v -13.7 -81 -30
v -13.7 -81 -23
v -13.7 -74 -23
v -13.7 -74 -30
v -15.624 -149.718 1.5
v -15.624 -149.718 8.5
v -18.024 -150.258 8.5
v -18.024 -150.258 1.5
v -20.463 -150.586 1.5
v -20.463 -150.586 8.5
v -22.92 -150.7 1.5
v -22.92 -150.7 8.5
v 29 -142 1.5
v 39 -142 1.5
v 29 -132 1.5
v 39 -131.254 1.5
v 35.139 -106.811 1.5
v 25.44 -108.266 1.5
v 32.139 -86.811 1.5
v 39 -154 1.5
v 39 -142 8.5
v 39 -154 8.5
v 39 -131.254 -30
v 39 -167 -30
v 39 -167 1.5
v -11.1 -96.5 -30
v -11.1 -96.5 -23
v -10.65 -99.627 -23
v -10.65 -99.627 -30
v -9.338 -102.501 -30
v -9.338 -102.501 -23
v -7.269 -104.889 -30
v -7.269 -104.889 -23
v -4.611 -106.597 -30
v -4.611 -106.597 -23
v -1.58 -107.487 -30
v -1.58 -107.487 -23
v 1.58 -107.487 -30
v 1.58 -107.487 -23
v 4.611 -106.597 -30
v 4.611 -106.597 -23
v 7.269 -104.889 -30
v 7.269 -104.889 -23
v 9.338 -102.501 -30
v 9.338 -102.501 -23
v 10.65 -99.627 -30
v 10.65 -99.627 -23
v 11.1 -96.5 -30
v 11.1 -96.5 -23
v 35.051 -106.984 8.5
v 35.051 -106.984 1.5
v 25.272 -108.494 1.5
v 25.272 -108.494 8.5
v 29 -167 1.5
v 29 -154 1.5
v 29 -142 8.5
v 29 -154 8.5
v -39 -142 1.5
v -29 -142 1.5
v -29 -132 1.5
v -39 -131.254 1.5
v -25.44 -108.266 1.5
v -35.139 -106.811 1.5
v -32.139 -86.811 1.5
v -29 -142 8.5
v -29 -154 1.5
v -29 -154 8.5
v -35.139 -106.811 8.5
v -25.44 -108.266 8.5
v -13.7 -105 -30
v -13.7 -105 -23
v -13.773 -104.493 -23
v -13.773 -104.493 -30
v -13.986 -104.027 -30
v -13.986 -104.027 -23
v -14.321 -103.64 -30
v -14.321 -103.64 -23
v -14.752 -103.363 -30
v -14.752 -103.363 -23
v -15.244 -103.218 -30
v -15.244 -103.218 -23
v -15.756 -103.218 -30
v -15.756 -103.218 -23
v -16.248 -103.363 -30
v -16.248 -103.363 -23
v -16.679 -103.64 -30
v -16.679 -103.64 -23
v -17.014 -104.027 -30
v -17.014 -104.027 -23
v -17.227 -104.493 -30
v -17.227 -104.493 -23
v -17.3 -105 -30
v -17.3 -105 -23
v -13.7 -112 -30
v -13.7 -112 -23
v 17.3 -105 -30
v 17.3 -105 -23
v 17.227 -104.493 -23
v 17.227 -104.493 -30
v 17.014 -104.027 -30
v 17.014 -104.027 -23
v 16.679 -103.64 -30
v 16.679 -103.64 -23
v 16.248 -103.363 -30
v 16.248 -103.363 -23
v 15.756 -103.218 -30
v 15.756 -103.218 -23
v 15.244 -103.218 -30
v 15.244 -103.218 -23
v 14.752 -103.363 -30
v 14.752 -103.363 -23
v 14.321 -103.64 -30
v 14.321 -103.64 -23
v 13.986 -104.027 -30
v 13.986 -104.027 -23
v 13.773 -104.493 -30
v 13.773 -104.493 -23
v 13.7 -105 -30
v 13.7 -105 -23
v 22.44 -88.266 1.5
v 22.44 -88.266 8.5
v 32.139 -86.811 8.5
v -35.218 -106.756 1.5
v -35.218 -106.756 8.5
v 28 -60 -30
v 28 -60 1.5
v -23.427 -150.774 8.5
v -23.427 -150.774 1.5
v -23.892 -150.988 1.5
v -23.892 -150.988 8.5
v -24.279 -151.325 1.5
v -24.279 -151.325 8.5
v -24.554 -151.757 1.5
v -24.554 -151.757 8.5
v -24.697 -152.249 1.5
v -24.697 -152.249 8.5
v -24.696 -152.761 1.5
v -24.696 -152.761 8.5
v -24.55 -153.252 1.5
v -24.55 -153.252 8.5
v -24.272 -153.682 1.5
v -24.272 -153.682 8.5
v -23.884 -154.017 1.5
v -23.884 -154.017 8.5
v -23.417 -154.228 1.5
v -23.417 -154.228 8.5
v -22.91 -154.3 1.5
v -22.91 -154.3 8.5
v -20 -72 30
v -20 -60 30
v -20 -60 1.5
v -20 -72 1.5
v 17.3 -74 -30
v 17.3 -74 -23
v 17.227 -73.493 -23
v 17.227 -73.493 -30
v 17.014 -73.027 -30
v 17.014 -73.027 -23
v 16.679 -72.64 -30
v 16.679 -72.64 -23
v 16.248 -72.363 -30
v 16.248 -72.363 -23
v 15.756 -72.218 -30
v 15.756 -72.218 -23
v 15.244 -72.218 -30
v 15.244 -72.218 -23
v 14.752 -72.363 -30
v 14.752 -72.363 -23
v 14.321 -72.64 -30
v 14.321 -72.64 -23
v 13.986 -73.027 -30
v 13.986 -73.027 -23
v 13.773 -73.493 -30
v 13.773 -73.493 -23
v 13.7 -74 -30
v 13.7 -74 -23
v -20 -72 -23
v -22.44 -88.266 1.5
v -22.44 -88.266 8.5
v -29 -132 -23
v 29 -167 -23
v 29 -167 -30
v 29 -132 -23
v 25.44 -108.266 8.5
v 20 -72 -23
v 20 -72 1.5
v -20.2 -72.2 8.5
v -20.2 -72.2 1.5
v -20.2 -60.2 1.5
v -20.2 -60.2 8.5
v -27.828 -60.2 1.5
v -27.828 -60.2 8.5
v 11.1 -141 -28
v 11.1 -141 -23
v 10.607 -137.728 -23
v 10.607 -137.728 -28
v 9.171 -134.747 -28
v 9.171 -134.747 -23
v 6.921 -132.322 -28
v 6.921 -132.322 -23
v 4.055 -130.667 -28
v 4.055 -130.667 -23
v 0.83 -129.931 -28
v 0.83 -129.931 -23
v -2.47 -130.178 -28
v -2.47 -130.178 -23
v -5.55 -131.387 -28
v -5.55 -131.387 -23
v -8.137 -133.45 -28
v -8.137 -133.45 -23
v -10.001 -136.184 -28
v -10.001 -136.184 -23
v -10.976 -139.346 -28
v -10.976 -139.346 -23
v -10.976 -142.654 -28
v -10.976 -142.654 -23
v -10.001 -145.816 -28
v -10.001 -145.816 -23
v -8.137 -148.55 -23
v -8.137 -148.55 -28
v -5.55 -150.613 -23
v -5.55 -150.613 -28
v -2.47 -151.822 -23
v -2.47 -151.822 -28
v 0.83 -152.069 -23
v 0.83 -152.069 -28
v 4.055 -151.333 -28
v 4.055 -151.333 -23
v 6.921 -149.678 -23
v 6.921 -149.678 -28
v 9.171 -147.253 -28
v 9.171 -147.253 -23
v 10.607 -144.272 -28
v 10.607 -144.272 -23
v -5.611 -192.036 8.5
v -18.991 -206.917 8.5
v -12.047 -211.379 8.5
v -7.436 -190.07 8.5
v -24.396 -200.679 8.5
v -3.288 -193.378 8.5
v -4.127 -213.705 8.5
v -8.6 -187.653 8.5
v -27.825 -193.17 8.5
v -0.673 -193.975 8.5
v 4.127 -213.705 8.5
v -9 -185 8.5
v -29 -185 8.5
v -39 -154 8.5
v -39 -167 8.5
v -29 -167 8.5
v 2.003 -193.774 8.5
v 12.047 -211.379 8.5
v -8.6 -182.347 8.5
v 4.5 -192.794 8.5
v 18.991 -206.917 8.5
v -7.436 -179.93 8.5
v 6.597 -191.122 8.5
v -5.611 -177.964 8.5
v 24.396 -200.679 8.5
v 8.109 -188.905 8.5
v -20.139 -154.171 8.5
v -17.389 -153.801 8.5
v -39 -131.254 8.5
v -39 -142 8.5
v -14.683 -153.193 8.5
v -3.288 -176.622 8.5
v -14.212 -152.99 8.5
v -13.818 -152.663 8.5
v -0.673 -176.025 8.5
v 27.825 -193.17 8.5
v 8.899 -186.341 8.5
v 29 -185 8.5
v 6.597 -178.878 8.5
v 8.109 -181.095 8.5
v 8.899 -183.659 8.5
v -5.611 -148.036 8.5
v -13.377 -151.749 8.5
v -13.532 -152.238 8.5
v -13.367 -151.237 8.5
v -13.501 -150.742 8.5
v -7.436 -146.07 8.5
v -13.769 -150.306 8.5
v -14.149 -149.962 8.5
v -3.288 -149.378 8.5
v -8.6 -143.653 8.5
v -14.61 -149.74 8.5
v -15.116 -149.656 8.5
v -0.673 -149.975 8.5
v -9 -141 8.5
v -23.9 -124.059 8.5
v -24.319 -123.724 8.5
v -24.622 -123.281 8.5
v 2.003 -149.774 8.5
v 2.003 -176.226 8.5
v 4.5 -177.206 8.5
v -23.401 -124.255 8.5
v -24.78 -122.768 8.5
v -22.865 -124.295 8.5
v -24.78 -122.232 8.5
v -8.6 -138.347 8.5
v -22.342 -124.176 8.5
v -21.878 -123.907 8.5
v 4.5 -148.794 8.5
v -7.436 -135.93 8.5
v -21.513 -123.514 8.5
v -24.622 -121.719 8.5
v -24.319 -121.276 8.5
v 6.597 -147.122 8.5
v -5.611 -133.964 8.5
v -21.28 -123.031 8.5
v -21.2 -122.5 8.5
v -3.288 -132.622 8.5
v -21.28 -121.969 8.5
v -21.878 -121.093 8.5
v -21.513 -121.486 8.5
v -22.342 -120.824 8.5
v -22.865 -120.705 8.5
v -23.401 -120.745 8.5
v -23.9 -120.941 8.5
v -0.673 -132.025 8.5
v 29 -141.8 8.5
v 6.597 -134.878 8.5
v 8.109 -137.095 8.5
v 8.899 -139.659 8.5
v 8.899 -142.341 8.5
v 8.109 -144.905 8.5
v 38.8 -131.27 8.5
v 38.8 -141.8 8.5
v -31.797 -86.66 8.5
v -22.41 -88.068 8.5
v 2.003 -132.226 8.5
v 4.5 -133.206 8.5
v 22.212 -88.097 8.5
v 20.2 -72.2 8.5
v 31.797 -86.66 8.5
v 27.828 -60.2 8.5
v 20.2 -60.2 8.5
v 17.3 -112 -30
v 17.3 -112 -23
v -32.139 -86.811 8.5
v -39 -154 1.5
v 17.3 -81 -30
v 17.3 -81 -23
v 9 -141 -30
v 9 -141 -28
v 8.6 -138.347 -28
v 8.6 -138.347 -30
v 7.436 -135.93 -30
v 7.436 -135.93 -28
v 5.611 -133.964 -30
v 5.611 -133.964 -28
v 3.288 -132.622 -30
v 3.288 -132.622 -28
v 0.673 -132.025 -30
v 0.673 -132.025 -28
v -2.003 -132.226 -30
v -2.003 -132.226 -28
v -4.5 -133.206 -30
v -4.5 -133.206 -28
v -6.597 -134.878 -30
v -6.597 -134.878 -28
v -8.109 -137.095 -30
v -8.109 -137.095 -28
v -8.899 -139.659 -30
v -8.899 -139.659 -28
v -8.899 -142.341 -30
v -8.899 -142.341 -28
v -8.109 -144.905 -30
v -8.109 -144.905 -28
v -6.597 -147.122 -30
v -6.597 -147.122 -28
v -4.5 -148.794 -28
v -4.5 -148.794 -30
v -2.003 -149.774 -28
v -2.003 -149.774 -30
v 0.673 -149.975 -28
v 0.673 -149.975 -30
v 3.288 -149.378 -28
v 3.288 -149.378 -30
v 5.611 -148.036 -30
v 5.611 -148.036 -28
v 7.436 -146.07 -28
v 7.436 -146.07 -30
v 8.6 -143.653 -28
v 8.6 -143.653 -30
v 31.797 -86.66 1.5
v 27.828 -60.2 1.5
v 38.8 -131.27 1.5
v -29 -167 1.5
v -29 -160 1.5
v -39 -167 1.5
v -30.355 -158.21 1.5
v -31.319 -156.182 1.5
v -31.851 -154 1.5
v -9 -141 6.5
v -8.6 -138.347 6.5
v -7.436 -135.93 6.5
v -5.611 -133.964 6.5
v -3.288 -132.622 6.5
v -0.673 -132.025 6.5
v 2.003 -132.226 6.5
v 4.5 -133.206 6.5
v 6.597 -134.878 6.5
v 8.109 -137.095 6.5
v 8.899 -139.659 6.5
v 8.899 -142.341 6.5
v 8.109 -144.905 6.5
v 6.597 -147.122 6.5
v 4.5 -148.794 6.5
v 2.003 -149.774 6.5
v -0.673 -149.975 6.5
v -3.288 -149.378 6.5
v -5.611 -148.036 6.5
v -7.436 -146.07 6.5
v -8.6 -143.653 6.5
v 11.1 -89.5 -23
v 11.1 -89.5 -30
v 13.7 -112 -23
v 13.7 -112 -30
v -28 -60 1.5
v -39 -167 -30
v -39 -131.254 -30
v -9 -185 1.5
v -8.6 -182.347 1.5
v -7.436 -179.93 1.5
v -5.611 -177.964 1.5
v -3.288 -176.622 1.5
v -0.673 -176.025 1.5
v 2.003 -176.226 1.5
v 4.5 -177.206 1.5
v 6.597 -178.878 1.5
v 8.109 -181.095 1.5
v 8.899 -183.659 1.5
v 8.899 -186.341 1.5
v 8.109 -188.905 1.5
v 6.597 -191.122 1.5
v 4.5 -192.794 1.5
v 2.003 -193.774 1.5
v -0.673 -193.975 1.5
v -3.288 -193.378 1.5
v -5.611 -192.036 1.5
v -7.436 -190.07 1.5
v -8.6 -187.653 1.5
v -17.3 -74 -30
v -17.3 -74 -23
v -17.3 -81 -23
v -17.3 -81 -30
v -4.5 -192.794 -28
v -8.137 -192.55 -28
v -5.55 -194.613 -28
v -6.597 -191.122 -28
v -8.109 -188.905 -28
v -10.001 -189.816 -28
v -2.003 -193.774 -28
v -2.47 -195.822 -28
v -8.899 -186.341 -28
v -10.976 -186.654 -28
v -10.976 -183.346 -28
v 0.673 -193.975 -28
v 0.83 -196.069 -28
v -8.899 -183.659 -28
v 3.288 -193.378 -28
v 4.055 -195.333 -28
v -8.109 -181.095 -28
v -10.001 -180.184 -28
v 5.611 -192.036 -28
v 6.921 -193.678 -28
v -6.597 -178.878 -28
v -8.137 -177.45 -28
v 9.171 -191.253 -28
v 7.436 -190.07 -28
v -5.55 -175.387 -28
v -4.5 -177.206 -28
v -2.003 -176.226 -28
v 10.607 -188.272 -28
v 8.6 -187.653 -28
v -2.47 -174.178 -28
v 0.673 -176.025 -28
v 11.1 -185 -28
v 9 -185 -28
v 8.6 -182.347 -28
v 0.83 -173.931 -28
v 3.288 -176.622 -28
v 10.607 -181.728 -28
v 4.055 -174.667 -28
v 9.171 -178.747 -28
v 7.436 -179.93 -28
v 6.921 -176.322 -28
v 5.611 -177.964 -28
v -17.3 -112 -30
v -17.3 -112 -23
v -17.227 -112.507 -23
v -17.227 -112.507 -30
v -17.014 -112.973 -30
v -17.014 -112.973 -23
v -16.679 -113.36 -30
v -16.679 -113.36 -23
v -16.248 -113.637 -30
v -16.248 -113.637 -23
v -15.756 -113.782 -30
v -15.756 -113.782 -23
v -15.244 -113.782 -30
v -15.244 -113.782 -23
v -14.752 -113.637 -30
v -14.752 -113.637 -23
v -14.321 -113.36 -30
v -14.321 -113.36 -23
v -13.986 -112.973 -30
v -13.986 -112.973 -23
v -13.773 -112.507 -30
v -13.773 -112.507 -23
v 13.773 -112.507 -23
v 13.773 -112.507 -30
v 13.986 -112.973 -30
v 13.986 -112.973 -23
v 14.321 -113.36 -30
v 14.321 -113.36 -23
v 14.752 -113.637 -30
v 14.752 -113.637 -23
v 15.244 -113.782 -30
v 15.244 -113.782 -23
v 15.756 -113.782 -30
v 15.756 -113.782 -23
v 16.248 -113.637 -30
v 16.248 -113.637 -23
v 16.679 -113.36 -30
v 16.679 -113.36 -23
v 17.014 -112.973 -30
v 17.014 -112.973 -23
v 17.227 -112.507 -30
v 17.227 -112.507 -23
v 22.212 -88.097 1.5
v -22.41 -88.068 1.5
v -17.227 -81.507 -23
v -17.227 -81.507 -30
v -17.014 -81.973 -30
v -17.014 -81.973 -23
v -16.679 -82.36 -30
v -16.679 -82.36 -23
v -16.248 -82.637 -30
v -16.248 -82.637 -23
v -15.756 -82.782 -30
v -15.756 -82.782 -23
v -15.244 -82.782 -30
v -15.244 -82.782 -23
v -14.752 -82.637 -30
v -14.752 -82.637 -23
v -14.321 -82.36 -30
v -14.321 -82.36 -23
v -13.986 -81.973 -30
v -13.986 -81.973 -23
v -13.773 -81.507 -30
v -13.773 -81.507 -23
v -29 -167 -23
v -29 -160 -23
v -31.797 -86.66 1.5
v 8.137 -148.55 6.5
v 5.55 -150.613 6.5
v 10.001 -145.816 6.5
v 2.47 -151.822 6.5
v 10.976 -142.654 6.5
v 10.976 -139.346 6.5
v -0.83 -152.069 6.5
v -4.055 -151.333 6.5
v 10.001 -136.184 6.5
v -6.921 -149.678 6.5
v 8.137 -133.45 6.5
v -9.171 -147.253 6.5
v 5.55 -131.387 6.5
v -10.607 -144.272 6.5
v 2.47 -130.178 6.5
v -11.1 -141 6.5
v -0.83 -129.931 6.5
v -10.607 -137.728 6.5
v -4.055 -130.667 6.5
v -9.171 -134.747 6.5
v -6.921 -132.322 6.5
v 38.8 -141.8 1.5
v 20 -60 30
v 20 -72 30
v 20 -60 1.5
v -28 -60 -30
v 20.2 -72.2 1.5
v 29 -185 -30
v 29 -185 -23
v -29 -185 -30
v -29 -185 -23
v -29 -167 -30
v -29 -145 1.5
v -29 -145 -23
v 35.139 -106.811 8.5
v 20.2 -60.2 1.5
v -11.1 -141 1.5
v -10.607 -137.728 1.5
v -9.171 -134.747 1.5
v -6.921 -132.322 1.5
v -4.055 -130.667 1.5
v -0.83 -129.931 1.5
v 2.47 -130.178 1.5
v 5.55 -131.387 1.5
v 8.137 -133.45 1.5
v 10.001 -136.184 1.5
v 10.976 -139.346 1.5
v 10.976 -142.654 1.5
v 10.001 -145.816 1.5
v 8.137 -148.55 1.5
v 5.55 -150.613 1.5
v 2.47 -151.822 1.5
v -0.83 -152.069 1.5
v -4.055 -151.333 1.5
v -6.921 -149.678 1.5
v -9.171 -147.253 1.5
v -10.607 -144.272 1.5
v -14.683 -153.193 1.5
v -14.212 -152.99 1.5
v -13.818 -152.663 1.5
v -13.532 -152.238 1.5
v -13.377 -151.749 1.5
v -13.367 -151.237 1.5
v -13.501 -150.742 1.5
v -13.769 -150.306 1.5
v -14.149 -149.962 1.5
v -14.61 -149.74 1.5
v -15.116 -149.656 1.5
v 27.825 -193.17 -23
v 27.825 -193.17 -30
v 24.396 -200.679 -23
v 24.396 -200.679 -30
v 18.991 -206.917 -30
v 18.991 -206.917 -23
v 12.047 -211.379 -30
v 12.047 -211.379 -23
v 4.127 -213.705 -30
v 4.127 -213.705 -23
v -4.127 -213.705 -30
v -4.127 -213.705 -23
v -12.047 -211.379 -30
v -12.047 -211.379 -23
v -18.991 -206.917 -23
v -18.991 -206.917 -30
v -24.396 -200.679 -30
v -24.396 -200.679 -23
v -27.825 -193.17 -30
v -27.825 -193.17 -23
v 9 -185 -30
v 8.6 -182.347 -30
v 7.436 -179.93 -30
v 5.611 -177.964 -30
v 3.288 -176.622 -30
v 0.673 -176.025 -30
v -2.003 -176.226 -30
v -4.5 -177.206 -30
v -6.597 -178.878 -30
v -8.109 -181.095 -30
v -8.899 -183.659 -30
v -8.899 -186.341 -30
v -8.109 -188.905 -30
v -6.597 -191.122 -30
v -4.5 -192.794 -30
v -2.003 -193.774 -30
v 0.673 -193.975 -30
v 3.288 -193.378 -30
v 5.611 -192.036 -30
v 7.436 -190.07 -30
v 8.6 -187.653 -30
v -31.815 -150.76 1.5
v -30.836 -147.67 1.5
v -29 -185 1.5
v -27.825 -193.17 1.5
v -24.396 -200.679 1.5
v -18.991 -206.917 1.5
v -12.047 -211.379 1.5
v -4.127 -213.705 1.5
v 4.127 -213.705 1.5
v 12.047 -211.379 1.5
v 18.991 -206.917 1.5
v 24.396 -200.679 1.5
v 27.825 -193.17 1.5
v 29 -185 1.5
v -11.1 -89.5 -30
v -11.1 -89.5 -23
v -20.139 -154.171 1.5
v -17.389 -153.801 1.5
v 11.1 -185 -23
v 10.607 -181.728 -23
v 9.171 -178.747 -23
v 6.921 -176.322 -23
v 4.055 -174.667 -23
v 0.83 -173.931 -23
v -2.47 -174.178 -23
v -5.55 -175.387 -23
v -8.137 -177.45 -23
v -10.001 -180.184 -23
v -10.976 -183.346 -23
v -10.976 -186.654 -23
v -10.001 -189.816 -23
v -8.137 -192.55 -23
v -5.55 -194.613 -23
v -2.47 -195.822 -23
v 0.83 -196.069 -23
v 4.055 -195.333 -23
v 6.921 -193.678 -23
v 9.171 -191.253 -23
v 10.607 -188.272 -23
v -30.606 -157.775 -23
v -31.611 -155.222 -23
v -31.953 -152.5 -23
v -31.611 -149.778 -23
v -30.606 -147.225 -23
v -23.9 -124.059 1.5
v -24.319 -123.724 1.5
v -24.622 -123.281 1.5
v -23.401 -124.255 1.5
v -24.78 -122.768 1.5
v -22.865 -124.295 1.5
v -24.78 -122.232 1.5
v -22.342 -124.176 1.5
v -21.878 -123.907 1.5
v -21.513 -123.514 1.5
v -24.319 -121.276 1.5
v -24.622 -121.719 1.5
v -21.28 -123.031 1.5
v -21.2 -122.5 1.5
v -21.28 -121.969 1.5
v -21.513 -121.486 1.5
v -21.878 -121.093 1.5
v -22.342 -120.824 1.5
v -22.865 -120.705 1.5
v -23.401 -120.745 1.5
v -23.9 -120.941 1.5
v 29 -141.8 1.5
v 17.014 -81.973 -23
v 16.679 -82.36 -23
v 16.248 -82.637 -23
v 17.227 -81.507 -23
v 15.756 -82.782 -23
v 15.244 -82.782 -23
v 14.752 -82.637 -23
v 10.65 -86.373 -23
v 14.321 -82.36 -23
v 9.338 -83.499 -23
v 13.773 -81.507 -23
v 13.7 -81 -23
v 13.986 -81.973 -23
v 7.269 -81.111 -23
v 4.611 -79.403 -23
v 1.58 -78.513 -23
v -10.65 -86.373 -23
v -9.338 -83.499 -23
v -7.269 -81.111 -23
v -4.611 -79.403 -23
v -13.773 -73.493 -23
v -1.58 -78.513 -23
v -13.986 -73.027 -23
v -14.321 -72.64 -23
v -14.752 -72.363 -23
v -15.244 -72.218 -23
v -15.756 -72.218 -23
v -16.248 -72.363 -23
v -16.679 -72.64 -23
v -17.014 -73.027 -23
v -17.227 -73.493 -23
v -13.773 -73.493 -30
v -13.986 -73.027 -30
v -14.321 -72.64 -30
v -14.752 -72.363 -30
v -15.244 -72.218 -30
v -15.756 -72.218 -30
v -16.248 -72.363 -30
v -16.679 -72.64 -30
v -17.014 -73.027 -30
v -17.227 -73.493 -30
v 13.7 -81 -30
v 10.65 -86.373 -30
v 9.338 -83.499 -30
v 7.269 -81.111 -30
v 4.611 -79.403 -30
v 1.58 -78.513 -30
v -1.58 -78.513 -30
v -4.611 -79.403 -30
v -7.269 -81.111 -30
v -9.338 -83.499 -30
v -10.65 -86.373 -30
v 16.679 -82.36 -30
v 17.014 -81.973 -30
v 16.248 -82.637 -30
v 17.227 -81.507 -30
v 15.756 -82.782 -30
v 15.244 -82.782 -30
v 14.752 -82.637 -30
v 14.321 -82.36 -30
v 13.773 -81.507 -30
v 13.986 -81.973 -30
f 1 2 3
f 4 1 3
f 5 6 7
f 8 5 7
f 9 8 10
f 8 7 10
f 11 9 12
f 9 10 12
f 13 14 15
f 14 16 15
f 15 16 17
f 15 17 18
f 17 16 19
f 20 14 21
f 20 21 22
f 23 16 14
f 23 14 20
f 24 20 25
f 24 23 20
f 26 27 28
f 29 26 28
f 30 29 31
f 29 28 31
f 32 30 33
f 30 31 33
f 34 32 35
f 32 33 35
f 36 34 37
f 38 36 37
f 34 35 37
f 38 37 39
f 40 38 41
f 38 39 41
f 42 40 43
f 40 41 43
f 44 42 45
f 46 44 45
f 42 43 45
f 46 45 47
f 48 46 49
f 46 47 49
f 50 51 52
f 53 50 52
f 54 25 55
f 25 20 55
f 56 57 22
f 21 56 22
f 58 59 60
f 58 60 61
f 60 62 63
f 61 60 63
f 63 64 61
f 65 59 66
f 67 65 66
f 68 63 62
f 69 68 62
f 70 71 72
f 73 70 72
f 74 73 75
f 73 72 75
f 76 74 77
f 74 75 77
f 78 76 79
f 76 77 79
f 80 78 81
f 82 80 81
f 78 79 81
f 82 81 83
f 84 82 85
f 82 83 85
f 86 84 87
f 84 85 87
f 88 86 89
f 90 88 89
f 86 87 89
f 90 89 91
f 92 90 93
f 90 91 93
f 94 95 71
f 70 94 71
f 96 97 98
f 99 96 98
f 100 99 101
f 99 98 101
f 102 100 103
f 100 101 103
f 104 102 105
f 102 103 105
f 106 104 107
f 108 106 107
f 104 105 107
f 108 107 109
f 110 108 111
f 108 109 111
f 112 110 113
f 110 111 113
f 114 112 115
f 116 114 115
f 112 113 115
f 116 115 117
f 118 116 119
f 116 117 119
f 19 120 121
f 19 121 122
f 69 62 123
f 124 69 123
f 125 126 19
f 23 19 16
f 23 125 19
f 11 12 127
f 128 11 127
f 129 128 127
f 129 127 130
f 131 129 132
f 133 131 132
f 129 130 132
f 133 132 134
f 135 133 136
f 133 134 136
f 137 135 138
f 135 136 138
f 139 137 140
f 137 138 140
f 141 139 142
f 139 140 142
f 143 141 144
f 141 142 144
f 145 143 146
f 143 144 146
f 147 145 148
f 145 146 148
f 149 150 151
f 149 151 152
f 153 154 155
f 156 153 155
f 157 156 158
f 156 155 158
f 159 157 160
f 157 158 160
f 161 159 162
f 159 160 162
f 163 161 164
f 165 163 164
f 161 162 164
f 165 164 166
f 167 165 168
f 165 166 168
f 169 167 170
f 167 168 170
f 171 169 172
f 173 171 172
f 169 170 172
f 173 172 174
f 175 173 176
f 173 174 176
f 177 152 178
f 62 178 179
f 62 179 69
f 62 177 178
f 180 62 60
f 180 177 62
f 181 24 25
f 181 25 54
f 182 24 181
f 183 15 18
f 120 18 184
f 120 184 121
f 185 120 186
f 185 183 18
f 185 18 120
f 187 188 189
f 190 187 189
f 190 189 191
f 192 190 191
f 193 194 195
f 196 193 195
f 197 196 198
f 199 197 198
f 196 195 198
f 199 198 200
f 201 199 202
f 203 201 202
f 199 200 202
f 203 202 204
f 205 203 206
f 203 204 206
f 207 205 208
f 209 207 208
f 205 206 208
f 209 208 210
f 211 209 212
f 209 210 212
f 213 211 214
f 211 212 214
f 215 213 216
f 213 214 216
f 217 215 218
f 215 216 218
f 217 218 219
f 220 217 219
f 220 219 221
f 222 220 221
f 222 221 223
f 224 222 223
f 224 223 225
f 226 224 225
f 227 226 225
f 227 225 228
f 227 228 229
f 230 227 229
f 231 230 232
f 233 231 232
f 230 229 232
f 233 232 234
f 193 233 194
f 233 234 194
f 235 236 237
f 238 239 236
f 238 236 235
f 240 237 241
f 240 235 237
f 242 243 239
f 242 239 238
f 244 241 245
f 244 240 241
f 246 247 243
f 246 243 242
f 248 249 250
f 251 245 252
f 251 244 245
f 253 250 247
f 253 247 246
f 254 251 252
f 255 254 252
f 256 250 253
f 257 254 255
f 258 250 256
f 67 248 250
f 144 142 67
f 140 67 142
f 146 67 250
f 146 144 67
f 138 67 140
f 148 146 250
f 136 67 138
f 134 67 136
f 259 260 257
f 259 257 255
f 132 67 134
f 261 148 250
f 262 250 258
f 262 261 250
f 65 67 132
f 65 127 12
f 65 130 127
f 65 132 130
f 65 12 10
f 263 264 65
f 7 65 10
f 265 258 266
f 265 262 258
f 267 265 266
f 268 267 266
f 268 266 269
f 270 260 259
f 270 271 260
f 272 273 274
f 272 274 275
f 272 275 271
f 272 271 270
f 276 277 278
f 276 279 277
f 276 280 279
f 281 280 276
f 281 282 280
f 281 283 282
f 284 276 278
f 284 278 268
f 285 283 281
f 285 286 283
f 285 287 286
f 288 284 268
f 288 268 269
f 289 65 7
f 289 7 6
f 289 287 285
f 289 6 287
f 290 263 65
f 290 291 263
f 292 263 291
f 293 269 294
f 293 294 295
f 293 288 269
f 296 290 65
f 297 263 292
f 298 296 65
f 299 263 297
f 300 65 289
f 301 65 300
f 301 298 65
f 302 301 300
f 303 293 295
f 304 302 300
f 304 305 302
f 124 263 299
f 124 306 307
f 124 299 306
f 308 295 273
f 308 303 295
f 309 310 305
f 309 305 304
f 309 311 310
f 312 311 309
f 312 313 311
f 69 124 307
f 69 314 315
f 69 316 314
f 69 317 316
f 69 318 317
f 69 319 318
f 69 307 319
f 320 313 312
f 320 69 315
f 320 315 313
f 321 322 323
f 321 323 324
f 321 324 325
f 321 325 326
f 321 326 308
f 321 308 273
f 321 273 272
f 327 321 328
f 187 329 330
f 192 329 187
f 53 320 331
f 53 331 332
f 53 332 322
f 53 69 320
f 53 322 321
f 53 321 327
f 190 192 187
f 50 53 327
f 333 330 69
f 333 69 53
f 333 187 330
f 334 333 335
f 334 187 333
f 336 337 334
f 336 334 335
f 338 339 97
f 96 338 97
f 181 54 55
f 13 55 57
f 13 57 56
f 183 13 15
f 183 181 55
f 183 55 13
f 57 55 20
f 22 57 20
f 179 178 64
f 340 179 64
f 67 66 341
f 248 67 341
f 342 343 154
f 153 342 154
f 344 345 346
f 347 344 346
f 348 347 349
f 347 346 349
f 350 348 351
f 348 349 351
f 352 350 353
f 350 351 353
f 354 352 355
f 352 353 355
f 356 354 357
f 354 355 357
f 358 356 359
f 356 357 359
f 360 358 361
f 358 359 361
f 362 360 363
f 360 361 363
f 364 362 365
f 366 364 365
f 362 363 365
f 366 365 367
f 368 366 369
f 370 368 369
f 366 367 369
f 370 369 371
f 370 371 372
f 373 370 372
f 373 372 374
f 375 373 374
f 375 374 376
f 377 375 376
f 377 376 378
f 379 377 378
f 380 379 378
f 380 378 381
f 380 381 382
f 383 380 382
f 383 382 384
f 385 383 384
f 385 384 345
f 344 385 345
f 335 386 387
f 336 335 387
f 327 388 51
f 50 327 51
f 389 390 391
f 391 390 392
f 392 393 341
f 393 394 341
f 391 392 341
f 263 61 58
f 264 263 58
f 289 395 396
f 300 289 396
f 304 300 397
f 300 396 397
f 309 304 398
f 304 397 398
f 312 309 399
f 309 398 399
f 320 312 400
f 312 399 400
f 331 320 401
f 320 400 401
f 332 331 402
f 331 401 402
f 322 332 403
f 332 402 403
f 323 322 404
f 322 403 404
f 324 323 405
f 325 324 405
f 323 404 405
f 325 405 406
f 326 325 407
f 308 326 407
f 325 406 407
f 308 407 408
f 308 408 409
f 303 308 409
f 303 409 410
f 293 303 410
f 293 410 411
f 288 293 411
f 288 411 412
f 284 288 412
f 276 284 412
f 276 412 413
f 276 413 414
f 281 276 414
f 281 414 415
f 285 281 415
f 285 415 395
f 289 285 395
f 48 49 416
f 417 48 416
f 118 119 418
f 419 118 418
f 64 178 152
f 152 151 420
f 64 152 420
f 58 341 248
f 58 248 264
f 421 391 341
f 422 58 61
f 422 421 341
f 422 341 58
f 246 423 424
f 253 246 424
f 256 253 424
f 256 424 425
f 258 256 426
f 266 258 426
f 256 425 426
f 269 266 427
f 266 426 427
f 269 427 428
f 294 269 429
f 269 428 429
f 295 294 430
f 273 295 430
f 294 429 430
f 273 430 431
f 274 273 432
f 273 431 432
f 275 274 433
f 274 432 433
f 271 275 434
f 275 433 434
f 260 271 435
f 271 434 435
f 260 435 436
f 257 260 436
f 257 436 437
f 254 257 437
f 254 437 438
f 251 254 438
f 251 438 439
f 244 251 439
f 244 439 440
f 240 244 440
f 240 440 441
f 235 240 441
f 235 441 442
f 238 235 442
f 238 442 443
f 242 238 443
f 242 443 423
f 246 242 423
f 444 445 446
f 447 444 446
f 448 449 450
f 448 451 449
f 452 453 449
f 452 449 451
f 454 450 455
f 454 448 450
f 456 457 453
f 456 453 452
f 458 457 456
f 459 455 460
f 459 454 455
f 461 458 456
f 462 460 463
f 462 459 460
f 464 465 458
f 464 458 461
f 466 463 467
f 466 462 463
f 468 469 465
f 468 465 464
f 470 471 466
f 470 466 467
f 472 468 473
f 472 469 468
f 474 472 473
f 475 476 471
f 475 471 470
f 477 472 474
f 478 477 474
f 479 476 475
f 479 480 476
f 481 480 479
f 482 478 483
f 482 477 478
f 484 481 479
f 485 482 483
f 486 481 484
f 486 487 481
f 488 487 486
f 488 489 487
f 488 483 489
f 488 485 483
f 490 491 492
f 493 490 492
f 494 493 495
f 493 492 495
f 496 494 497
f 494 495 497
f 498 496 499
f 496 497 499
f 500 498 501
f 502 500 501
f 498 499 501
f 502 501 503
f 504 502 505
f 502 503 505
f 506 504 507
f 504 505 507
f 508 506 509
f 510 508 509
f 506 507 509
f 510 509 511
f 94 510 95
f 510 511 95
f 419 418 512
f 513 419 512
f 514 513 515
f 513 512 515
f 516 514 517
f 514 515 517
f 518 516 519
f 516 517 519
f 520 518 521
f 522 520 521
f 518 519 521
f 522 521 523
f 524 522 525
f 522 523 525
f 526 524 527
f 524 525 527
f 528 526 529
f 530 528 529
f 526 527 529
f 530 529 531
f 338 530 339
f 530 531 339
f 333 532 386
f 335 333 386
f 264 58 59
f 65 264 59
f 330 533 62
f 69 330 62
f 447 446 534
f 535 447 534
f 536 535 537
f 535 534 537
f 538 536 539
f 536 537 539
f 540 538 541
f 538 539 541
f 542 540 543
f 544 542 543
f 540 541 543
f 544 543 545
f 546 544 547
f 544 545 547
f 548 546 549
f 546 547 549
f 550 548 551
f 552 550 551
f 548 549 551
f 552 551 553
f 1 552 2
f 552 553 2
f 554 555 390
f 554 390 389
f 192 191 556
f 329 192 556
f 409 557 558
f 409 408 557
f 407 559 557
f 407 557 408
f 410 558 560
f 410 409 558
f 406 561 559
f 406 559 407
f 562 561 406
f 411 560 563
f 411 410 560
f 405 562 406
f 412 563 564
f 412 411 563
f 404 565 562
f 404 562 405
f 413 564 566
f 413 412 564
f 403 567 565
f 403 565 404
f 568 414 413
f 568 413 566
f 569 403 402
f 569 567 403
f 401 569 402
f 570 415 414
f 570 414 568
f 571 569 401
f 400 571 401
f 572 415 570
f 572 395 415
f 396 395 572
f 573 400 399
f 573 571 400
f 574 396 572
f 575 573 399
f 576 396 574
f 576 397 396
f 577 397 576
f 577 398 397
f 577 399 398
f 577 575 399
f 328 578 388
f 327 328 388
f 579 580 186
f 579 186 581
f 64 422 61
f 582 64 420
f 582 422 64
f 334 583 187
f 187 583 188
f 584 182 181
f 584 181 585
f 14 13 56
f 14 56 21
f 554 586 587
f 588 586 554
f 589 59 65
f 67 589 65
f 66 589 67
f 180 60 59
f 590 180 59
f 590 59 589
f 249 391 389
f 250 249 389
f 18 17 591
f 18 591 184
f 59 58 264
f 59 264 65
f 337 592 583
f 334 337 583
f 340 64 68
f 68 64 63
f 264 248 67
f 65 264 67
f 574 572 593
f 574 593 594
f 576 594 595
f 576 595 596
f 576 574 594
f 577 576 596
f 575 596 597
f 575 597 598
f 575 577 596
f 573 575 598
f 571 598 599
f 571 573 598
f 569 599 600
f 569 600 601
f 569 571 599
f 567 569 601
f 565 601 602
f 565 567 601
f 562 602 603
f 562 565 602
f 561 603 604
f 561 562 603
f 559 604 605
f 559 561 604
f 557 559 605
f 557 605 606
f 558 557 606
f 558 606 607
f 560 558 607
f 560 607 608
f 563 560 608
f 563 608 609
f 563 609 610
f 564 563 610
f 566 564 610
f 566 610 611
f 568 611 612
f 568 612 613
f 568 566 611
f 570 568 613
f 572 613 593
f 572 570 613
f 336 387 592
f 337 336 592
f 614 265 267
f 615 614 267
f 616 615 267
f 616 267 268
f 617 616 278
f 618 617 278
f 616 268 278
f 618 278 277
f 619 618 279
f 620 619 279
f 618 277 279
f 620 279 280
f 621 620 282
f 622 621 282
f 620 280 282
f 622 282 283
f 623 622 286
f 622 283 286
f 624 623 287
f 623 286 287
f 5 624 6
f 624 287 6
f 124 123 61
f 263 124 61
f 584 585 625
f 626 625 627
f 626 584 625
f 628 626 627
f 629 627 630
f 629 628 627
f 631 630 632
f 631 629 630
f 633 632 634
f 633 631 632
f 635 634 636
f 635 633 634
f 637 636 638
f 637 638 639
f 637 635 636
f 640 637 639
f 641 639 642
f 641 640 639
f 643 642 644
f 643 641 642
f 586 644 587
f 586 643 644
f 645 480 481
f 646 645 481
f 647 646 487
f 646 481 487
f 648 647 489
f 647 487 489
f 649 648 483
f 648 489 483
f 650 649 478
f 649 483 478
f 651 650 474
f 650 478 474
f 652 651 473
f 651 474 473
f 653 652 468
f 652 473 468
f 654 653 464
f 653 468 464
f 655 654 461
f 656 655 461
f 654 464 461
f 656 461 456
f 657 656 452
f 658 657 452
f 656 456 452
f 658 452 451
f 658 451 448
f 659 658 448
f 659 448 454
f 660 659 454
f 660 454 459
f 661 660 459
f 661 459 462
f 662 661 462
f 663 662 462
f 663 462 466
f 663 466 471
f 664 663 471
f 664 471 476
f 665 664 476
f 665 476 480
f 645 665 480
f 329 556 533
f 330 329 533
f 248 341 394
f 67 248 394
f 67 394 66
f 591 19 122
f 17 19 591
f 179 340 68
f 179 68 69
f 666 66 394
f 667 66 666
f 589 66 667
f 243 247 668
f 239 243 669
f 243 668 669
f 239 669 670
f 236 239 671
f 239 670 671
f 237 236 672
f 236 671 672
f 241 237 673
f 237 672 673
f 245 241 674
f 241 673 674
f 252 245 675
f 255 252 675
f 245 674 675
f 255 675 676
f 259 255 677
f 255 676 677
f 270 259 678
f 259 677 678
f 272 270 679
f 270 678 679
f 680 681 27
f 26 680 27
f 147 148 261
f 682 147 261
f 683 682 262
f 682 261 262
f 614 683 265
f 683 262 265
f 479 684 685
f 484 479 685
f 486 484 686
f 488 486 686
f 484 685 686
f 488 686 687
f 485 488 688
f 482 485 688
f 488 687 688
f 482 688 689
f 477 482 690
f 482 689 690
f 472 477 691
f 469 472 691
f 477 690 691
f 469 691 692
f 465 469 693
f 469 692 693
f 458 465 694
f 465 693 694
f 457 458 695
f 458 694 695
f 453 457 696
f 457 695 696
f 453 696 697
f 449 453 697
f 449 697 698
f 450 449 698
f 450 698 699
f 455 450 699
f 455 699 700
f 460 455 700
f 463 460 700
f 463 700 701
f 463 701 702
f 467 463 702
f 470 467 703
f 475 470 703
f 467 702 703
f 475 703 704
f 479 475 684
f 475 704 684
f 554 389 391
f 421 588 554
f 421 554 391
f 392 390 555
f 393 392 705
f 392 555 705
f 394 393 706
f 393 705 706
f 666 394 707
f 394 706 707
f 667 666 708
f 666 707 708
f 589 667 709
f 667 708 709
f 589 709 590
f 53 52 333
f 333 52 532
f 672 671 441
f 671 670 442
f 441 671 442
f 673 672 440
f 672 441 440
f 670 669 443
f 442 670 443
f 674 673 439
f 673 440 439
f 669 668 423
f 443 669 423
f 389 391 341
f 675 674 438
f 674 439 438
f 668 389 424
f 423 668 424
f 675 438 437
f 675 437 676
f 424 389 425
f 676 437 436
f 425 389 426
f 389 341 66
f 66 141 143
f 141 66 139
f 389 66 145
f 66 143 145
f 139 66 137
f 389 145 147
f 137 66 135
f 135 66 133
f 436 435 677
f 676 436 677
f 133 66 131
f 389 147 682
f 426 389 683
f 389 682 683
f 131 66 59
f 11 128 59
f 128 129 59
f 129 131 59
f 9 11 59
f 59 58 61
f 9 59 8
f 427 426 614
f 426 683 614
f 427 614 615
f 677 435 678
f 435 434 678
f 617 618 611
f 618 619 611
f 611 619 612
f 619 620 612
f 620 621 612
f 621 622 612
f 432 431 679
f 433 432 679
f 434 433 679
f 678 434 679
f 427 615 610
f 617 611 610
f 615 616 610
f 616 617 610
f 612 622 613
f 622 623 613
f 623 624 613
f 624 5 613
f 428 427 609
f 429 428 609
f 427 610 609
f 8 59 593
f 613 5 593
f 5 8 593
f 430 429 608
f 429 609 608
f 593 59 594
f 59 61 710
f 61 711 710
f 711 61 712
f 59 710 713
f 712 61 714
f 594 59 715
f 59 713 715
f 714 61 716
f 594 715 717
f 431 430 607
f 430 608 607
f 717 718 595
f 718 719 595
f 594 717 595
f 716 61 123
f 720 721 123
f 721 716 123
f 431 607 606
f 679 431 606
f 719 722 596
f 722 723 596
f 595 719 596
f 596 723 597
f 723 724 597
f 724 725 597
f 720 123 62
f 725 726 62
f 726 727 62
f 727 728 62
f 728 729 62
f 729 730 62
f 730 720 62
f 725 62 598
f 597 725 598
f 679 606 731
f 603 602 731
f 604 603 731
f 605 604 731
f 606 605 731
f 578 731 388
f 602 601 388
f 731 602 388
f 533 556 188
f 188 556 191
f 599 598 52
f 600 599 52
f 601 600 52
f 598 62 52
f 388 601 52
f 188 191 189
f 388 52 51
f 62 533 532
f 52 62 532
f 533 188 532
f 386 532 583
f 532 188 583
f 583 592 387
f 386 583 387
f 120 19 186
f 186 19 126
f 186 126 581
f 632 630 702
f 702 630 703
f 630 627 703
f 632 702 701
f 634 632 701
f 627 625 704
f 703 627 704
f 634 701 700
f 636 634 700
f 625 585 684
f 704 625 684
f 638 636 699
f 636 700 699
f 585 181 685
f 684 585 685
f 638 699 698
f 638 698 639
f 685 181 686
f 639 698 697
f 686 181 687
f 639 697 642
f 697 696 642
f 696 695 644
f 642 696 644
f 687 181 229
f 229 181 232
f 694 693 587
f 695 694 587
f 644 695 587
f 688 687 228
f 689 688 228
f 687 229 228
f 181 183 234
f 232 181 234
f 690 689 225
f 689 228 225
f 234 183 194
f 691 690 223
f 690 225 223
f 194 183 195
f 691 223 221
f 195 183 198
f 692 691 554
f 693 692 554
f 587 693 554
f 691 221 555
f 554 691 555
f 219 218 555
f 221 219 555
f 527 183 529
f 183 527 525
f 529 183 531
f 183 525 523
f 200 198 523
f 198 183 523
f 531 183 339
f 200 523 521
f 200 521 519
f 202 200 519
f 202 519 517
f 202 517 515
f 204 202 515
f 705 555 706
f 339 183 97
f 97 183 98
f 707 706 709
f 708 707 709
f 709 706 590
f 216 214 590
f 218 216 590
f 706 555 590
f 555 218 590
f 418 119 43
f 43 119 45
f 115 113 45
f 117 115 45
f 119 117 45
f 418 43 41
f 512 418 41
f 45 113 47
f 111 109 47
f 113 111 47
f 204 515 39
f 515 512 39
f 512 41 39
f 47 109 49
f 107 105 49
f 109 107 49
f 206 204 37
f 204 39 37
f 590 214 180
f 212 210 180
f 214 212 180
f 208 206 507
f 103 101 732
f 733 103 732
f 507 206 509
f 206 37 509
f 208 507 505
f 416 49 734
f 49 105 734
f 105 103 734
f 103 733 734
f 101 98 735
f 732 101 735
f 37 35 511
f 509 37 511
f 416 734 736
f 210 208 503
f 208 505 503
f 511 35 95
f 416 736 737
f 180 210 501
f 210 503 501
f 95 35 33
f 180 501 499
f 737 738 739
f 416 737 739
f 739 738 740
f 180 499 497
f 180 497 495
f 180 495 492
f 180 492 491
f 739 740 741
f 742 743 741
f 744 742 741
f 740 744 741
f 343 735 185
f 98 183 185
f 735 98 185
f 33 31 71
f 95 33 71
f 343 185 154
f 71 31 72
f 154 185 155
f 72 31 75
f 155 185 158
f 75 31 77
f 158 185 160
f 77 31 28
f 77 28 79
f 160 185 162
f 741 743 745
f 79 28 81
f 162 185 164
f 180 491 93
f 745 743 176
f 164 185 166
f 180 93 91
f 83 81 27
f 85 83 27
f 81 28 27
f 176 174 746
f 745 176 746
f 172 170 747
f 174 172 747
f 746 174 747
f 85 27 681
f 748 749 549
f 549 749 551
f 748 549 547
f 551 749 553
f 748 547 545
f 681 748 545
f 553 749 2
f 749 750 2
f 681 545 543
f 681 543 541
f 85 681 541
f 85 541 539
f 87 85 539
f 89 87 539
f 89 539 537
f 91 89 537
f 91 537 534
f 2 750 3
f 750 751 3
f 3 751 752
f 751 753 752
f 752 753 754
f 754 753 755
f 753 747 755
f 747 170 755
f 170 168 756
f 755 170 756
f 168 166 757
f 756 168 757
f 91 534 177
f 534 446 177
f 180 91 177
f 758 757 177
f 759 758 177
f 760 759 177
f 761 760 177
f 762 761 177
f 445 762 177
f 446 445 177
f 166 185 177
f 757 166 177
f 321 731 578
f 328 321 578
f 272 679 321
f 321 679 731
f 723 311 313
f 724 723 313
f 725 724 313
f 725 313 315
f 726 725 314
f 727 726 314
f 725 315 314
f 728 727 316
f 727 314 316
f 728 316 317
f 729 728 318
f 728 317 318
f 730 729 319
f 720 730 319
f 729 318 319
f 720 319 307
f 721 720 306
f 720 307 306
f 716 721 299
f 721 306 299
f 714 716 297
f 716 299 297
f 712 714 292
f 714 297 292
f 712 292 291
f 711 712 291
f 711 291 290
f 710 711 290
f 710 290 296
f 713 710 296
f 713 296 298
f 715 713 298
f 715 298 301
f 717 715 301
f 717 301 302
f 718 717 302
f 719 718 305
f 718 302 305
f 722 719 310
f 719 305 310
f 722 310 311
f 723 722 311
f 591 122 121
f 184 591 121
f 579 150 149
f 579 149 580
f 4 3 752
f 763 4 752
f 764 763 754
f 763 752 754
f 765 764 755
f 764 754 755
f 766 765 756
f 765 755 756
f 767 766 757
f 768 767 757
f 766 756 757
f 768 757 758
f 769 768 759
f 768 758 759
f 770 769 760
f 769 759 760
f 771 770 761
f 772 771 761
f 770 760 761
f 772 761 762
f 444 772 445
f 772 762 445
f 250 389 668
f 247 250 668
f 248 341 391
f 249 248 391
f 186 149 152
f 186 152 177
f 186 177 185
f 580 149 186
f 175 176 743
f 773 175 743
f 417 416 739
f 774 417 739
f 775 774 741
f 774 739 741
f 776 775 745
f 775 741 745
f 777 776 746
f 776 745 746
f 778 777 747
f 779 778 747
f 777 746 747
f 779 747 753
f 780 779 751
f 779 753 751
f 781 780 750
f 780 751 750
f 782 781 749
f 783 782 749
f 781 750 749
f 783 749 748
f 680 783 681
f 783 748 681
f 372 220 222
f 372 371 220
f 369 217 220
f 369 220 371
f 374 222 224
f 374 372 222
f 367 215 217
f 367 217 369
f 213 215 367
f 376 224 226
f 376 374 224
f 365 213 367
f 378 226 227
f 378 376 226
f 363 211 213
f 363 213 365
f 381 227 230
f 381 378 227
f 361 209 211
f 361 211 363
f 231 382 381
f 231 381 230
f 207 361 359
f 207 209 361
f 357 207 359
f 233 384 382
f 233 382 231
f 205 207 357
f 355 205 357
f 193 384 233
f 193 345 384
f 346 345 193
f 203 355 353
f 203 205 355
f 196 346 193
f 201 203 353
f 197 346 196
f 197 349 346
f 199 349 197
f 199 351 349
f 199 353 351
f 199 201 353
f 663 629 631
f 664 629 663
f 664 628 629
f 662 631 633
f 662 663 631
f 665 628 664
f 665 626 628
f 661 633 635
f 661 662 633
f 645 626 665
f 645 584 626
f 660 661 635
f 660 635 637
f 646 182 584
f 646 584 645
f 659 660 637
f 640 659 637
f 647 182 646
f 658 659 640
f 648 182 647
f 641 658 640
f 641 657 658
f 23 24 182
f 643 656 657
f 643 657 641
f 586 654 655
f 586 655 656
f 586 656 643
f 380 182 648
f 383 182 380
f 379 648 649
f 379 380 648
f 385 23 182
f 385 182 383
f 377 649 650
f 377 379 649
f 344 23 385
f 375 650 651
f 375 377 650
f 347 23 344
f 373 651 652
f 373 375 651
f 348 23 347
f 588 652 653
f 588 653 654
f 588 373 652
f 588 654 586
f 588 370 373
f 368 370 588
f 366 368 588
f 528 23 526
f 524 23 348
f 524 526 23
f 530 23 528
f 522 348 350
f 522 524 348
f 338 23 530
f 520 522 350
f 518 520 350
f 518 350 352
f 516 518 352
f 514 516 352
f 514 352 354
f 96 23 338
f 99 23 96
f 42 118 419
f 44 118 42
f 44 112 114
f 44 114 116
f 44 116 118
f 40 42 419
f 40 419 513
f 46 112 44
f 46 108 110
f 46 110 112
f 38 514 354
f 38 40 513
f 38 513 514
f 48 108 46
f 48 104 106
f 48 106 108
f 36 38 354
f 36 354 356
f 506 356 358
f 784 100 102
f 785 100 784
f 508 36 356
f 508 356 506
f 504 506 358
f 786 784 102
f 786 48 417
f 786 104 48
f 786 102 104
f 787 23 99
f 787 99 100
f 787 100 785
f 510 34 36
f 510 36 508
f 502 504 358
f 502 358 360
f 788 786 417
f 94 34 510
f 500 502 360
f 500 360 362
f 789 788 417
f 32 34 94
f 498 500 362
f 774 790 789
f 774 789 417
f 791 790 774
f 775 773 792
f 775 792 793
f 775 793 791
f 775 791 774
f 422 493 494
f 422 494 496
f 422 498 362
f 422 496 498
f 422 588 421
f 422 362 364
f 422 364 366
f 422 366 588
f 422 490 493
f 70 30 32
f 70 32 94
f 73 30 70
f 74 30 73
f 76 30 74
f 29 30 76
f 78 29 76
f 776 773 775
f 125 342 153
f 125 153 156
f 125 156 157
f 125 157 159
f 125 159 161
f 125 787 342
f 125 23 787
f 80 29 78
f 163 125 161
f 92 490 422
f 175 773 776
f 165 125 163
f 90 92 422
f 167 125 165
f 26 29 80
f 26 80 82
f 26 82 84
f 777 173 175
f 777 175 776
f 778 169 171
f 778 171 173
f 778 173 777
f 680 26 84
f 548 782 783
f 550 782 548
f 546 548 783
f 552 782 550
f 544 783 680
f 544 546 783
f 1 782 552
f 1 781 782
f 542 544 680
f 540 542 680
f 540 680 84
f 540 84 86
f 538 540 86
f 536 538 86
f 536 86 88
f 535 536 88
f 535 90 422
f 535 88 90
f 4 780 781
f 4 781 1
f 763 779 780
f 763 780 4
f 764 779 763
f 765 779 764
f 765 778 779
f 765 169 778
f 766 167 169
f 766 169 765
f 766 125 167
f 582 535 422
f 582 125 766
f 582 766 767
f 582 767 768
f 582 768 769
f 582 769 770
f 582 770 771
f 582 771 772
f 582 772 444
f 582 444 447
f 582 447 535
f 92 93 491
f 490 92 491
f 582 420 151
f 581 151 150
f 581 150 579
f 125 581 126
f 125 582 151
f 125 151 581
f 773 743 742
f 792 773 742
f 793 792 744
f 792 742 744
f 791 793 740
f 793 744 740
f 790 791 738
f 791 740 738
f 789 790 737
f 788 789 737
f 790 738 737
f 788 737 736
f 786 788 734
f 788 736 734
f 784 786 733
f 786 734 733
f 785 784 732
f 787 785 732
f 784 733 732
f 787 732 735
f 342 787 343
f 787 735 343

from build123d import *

# Parameters (mm, degrees)
SKETCH1_R           = 4
BOSS_EXTRUDE1_DEPTH = 30
SKETCH1_3_R         = 4
CUT_EXTRUDE1_DEPTH  = 17.5
BOSS_EXTRUDE2_DEPTH = 7
BOSS_EXTRUDE3_DEPTH = 31.5
CUT_EXTRUDE2_DEPTH  = 224.888365039
SKETCH5_R           = 9
CUT_EXTRUDE3_DEPTH  = 224.888365039
SKETCH5_3_R         = 11.1
SKETCH5_3_R_2       = 9
CUT_EXTRUDE4_DEPTH  = 5
SKETCH8_W           = 10
SKETCH8_H           = 12
BOSS_EXTRUDE4_DEPTH = 7
BOSS_EXTRUDE6_DEPTH = 7
SKETCH12_R          = 9
CUT_EXTRUDE5_DEPTH  = 220.79365323
CUT_EXTRUDE8_START  = -5
SKETCH12_6_R        = 11.1
SKETCH12_6_R_2      = 9
CUT_EXTRUDE8_DEPTH  = 5
SKETCH14_R          = 1.8
CUT_EXTRUDE9_DEPTH  = 7
CUT_EXTRUDE10_DEPTH = 24.5
SKETCH16_W          = 80
SKETCH16_H          = 75
CUT_EXTRUDE11_DEPTH = 162.669415784


# Read off the part's stored shape, not the designer's step: Boss-Extrude6
with BuildPart() as part:
    # Sketch1 → Boss-Extrude1 (new, symmetric)
    with BuildSketch(Plane.XY):
        with BuildLine():
            Line((-20, -72), (20, -72))
            Line((20, -72), (20, 0))
            ThreePointArc((20, 0), (18.973665961, 6.32455532), (16, 12))
            ThreePointArc((16, 12), (0, 16.622844919), (-16, 12))
            ThreePointArc((-16, 12), (-18.973665961, 6.32455532), (-20, 0))
            Line((-20, 0), (-20, -72))
        make_face()
        Circle(SKETCH1_R, mode=Mode.SUBTRACT)
    extrude(amount=BOSS_EXTRUDE1_DEPTH, both=True)

    # Sketch1<3> → Cut-Extrude1 (cut, symmetric)
    with BuildSketch(Plane.XY):
        with BuildLine():
            Line((-20, -60), (20, -60))
            Line((20, -60), (20, 0))
            ThreePointArc((20, 0), (18.973665961, 6.32455532), (16, 12))
            ThreePointArc((16, 12), (0, 16.622844919), (-16, 12))
            ThreePointArc((-16, 12), (-18.973665961, 6.32455532), (-20, 0))
            Line((-20, 0), (-20, -60))
        make_face()
        Circle(SKETCH1_3_R, mode=Mode.SUBTRACT)
    extrude(amount=CUT_EXTRUDE1_DEPTH, both=True, mode=Mode.SUBTRACT)

    # Sketch2 → Boss-Extrude2 (add)
    with BuildSketch(Plane(origin=(0, 0, -30), x_dir=(-1, 0, 0), z_dir=(0, 0, -1))):
        with BuildLine():
            Line((-20, -72), (-29, -132))
            Line((-29, -132), (-29, -167))
            Line((-29, -167), (-29, -185))
            ThreePointArc((-29, -185), (0, -214), (29, -185))
            Line((29, -185), (29, -167))
            Line((29, -167), (29, -132))
            Line((29, -132), (20, -72))
            Line((20, -72), (-20, -72))
        make_face()
    extrude(amount=-BOSS_EXTRUDE2_DEPTH)

    # Sketch2<3> → Boss-Extrude3 (add)
    with BuildSketch(Plane(origin=(0, 0, -30), x_dir=(-1, 0, 0), z_dir=(0, 0, -1))):
        Polygon((-29, -167), (-29, -132), (-20, -72), (-20, -60), (-28, -60), (-39, -131.254171946), (-39, -167), align=None)
        Polygon((20, -60), (20, -72), (29, -132), (29, -167), (39, -167), (39, -131.254171946), (28, -60), align=None)
    extrude(amount=-BOSS_EXTRUDE3_DEPTH)

    # Sketch4 → Cut-Extrude2 (cut, through all)
    with BuildSketch(Plane.XY.offset(-23)):
        with BuildLine():
            Line((-13.7, -112), (-13.7, -105))
            ThreePointArc((-13.7, -105), (-15.5, -103.2), (-17.3, -105))
            Line((-17.3, -105), (-17.3, -112))
            ThreePointArc((-17.3, -112), (-15.5, -113.8), (-13.7, -112))
        make_face()
        with BuildLine():
            Line((17.3, -112), (17.3, -105))
            ThreePointArc((17.3, -105), (15.5, -103.2), (13.7, -105))
            Line((13.7, -105), (13.7, -112))
            ThreePointArc((13.7, -112), (15.5, -113.8), (17.3, -112))
        make_face()
        with BuildLine():
            Line((17.3, -81), (17.3, -74))
            ThreePointArc((17.3, -74), (15.5, -72.2), (13.7, -74))
            Line((13.7, -74), (13.7, -81))
            ThreePointArc((13.7, -81), (15.5, -82.8), (17.3, -81))
        make_face()
        with BuildLine():
            Line((11.1, -96.5), (11.1, -89.5))
            ThreePointArc((11.1, -89.5), (0, -78.4), (-11.1, -89.5))
            Line((-11.1, -89.5), (-11.1, -96.5))
            ThreePointArc((-11.1, -96.5), (0, -107.6), (11.1, -96.5))
        make_face()
        with BuildLine():
            Line((-13.7, -81), (-13.7, -74))
            ThreePointArc((-13.7, -74), (-15.5, -72.2), (-17.3, -74))
            Line((-17.3, -74), (-17.3, -81))
            ThreePointArc((-17.3, -81), (-15.5, -82.8), (-13.7, -81))
        make_face()
    extrude(amount=-CUT_EXTRUDE2_DEPTH, mode=Mode.SUBTRACT)

    # Sketch5 → Cut-Extrude3 (cut, through all)
    with BuildSketch(Plane.XY.offset(-23)):
        with Locations((0, -185)):
            Circle(SKETCH5_R)
        with Locations((0, -141)):
            Circle(SKETCH5_R)
    extrude(amount=-CUT_EXTRUDE3_DEPTH, mode=Mode.SUBTRACT)

    # Sketch5<3> → Cut-Extrude4 (cut)
    # profile 1 of 2: a face of its own
    with BuildSketch(Plane.XY.offset(-23)):
        with Locations((0, -141)):
            Circle(SKETCH5_3_R)
        with Locations((0, -141)):
            Circle(SKETCH5_3_R_2, mode=Mode.SUBTRACT)
    # profile 2 of 2: a face of its own
    with BuildSketch(Plane.XY.offset(-23)):
        with Locations((0, -185)):
            Circle(SKETCH5_3_R)
        with Locations((0, -185)):
            Circle(SKETCH5_3_R_2, mode=Mode.SUBTRACT)
    extrude(amount=-CUT_EXTRUDE4_DEPTH, mode=Mode.SUBTRACT)

    # Sketch8 → Boss-Extrude4 (add)
    with BuildSketch(Plane.XY.offset(1.5)):
        Polygon((-22.43982913, -88.265527531), (-32.138947235, -86.810659815), (-35.138947235, -106.810659815), (-25.43982913, -108.265527531), align=None)
        with Locations((-34, -148)):
            Rectangle(SKETCH8_W, SKETCH8_H)
        with Locations((34, -148)):
            Rectangle(SKETCH8_W, SKETCH8_H)
        Polygon((25.43982913, -108.265527531), (22.43982913, -88.265527531), (32.138947235, -86.810659815), (35.138947235, -106.810659815), align=None)
    extrude(amount=BOSS_EXTRUDE4_DEPTH)

    # Sketch15 → Cut-Extrude10 (cut)
    with BuildSketch(Plane.XY.offset(-23)):
        with BuildLine():
            Line((-29, -145), (-29, -160))
            ThreePointArc((-29, -160), (-31.95326153, -152.5), (-29, -145))
        make_face()
    extrude(amount=CUT_EXTRUDE10_DEPTH, mode=Mode.SUBTRACT)

    # Sketch16 → Cut-Extrude11 (cut, through all)
    with BuildSketch(Plane(origin=(0, -60, 0), x_dir=(1, 0, 0), z_dir=(0, 1, 0))):
        Rectangle(SKETCH16_W, SKETCH16_H)
    extrude(amount=CUT_EXTRUDE11_DEPTH, mode=Mode.SUBTRACT)


with BuildPart() as body_2:
    # Boss-Extrude6 outline → Boss-Extrude6 (new body)
    with BuildSketch(Plane.XY.offset(1.5)):
        with BuildLine():
            ThreePointArc((-29, -185), (0, -214), (29, -185))
            Line((29, -185), (29, -141.8))
            Line((29, -141.8), (38.8, -141.8))
            Line((38.8, -141.8), (38.8, -131.26951874))
            Line((38.8, -131.26951874), (35.050902338, -106.984168789))
            Line((35.050902338, -106.984168789), (25.271837137, -108.493830809))
            Line((25.271837137, -108.493830809), (22.212373769, -88.097408351))
            Line((22.212373769, -88.097408351), (31.796725847, -86.659755539))
            Line((31.796725847, -86.659755539), (27.827762516, -60.2))
            Line((27.827762516, -60.2), (20.2, -60.2))
            Line((20.2, -60.2), (20.2, -72.2))
            Line((20.2, -72.2), (-20.2, -72.2))
            Line((-20.2, -72.2), (-20.2, -60.2))
            Line((-20.2, -60.2), (-27.827762516, -60.2))
            Line((-27.827762516, -60.2), (-31.796725847, -86.659755539))
            Line((-31.796725847, -86.659755539), (-22.410161039, -88.067740261))
            Line((-22.410161039, -88.067740261), (-25.43982913, -108.265527531))
            Line((-25.43982913, -108.265527531), (-35.218046965, -106.755996324))
            Line((-35.218046965, -106.755996324), (-39, -131.254171946))
            Line((-39, -131.254171946), (-39, -142))
            Line((-39, -142), (-29, -142))
            Line((-29, -142), (-29, -154))
            Line((-29, -154), (-39, -154))
            Line((-39, -154), (-39, -167))
            Line((-39, -167), (-29, -167))
            Line((-29, -167), (-29, -185))
        make_face()
    extrude(amount=BOSS_EXTRUDE6_DEPTH)

    # Sketch12 → Cut-Extrude5 (cut, through all)
    with BuildSketch(Plane(origin=(0, 0, 1.5), x_dir=(-1, 0, 0), z_dir=(0, 0, -1))):
        with Locations((0, -185)):
            Circle(SKETCH12_R)
        with Locations((0, -141)):
            Circle(SKETCH12_R)
    extrude(amount=-CUT_EXTRUDE5_DEPTH, mode=Mode.SUBTRACT)

    # Sketch12<6> → Cut-Extrude8 (cut)
    with BuildSketch(Plane(origin=(0, 0, 1.5), x_dir=(-1, 0, 0), z_dir=(0, 0, -1)).offset(CUT_EXTRUDE8_START)):
        with Locations((0, -141)):
            Circle(SKETCH12_6_R)
        with Locations((0, -141)):
            Circle(SKETCH12_6_R_2, mode=Mode.SUBTRACT)
    extrude(amount=CUT_EXTRUDE8_DEPTH, mode=Mode.SUBTRACT)

    # Sketch14 → Cut-Extrude9 (cut)
    with BuildSketch(Plane.XY.offset(8.5)):
        with BuildLine():
            ThreePointArc((-22.909945843, -154.299872488), (-18.76, -154.016065744), (-14.682601732, -153.193010378))
            ThreePointArc((-14.682601732, -153.193010378), (-13.416057651, -150.984874039), (-15.624193989, -149.718329958))
            ThreePointArc((-15.624193989, -149.718329958), (-19.24, -150.448209245), (-22.920140653, -150.699886923))
            ThreePointArc((-22.920140653, -150.699886923), (-24.715036031, -152.504977111), (-22.909945843, -154.299872488))
        make_face()
        with Locations((-23, -122.5)):
            Circle(SKETCH14_R)
    extrude(amount=-CUT_EXTRUDE9_DEPTH, mode=Mode.SUBTRACT)


solid = Compound([part.part, body_2.part])
